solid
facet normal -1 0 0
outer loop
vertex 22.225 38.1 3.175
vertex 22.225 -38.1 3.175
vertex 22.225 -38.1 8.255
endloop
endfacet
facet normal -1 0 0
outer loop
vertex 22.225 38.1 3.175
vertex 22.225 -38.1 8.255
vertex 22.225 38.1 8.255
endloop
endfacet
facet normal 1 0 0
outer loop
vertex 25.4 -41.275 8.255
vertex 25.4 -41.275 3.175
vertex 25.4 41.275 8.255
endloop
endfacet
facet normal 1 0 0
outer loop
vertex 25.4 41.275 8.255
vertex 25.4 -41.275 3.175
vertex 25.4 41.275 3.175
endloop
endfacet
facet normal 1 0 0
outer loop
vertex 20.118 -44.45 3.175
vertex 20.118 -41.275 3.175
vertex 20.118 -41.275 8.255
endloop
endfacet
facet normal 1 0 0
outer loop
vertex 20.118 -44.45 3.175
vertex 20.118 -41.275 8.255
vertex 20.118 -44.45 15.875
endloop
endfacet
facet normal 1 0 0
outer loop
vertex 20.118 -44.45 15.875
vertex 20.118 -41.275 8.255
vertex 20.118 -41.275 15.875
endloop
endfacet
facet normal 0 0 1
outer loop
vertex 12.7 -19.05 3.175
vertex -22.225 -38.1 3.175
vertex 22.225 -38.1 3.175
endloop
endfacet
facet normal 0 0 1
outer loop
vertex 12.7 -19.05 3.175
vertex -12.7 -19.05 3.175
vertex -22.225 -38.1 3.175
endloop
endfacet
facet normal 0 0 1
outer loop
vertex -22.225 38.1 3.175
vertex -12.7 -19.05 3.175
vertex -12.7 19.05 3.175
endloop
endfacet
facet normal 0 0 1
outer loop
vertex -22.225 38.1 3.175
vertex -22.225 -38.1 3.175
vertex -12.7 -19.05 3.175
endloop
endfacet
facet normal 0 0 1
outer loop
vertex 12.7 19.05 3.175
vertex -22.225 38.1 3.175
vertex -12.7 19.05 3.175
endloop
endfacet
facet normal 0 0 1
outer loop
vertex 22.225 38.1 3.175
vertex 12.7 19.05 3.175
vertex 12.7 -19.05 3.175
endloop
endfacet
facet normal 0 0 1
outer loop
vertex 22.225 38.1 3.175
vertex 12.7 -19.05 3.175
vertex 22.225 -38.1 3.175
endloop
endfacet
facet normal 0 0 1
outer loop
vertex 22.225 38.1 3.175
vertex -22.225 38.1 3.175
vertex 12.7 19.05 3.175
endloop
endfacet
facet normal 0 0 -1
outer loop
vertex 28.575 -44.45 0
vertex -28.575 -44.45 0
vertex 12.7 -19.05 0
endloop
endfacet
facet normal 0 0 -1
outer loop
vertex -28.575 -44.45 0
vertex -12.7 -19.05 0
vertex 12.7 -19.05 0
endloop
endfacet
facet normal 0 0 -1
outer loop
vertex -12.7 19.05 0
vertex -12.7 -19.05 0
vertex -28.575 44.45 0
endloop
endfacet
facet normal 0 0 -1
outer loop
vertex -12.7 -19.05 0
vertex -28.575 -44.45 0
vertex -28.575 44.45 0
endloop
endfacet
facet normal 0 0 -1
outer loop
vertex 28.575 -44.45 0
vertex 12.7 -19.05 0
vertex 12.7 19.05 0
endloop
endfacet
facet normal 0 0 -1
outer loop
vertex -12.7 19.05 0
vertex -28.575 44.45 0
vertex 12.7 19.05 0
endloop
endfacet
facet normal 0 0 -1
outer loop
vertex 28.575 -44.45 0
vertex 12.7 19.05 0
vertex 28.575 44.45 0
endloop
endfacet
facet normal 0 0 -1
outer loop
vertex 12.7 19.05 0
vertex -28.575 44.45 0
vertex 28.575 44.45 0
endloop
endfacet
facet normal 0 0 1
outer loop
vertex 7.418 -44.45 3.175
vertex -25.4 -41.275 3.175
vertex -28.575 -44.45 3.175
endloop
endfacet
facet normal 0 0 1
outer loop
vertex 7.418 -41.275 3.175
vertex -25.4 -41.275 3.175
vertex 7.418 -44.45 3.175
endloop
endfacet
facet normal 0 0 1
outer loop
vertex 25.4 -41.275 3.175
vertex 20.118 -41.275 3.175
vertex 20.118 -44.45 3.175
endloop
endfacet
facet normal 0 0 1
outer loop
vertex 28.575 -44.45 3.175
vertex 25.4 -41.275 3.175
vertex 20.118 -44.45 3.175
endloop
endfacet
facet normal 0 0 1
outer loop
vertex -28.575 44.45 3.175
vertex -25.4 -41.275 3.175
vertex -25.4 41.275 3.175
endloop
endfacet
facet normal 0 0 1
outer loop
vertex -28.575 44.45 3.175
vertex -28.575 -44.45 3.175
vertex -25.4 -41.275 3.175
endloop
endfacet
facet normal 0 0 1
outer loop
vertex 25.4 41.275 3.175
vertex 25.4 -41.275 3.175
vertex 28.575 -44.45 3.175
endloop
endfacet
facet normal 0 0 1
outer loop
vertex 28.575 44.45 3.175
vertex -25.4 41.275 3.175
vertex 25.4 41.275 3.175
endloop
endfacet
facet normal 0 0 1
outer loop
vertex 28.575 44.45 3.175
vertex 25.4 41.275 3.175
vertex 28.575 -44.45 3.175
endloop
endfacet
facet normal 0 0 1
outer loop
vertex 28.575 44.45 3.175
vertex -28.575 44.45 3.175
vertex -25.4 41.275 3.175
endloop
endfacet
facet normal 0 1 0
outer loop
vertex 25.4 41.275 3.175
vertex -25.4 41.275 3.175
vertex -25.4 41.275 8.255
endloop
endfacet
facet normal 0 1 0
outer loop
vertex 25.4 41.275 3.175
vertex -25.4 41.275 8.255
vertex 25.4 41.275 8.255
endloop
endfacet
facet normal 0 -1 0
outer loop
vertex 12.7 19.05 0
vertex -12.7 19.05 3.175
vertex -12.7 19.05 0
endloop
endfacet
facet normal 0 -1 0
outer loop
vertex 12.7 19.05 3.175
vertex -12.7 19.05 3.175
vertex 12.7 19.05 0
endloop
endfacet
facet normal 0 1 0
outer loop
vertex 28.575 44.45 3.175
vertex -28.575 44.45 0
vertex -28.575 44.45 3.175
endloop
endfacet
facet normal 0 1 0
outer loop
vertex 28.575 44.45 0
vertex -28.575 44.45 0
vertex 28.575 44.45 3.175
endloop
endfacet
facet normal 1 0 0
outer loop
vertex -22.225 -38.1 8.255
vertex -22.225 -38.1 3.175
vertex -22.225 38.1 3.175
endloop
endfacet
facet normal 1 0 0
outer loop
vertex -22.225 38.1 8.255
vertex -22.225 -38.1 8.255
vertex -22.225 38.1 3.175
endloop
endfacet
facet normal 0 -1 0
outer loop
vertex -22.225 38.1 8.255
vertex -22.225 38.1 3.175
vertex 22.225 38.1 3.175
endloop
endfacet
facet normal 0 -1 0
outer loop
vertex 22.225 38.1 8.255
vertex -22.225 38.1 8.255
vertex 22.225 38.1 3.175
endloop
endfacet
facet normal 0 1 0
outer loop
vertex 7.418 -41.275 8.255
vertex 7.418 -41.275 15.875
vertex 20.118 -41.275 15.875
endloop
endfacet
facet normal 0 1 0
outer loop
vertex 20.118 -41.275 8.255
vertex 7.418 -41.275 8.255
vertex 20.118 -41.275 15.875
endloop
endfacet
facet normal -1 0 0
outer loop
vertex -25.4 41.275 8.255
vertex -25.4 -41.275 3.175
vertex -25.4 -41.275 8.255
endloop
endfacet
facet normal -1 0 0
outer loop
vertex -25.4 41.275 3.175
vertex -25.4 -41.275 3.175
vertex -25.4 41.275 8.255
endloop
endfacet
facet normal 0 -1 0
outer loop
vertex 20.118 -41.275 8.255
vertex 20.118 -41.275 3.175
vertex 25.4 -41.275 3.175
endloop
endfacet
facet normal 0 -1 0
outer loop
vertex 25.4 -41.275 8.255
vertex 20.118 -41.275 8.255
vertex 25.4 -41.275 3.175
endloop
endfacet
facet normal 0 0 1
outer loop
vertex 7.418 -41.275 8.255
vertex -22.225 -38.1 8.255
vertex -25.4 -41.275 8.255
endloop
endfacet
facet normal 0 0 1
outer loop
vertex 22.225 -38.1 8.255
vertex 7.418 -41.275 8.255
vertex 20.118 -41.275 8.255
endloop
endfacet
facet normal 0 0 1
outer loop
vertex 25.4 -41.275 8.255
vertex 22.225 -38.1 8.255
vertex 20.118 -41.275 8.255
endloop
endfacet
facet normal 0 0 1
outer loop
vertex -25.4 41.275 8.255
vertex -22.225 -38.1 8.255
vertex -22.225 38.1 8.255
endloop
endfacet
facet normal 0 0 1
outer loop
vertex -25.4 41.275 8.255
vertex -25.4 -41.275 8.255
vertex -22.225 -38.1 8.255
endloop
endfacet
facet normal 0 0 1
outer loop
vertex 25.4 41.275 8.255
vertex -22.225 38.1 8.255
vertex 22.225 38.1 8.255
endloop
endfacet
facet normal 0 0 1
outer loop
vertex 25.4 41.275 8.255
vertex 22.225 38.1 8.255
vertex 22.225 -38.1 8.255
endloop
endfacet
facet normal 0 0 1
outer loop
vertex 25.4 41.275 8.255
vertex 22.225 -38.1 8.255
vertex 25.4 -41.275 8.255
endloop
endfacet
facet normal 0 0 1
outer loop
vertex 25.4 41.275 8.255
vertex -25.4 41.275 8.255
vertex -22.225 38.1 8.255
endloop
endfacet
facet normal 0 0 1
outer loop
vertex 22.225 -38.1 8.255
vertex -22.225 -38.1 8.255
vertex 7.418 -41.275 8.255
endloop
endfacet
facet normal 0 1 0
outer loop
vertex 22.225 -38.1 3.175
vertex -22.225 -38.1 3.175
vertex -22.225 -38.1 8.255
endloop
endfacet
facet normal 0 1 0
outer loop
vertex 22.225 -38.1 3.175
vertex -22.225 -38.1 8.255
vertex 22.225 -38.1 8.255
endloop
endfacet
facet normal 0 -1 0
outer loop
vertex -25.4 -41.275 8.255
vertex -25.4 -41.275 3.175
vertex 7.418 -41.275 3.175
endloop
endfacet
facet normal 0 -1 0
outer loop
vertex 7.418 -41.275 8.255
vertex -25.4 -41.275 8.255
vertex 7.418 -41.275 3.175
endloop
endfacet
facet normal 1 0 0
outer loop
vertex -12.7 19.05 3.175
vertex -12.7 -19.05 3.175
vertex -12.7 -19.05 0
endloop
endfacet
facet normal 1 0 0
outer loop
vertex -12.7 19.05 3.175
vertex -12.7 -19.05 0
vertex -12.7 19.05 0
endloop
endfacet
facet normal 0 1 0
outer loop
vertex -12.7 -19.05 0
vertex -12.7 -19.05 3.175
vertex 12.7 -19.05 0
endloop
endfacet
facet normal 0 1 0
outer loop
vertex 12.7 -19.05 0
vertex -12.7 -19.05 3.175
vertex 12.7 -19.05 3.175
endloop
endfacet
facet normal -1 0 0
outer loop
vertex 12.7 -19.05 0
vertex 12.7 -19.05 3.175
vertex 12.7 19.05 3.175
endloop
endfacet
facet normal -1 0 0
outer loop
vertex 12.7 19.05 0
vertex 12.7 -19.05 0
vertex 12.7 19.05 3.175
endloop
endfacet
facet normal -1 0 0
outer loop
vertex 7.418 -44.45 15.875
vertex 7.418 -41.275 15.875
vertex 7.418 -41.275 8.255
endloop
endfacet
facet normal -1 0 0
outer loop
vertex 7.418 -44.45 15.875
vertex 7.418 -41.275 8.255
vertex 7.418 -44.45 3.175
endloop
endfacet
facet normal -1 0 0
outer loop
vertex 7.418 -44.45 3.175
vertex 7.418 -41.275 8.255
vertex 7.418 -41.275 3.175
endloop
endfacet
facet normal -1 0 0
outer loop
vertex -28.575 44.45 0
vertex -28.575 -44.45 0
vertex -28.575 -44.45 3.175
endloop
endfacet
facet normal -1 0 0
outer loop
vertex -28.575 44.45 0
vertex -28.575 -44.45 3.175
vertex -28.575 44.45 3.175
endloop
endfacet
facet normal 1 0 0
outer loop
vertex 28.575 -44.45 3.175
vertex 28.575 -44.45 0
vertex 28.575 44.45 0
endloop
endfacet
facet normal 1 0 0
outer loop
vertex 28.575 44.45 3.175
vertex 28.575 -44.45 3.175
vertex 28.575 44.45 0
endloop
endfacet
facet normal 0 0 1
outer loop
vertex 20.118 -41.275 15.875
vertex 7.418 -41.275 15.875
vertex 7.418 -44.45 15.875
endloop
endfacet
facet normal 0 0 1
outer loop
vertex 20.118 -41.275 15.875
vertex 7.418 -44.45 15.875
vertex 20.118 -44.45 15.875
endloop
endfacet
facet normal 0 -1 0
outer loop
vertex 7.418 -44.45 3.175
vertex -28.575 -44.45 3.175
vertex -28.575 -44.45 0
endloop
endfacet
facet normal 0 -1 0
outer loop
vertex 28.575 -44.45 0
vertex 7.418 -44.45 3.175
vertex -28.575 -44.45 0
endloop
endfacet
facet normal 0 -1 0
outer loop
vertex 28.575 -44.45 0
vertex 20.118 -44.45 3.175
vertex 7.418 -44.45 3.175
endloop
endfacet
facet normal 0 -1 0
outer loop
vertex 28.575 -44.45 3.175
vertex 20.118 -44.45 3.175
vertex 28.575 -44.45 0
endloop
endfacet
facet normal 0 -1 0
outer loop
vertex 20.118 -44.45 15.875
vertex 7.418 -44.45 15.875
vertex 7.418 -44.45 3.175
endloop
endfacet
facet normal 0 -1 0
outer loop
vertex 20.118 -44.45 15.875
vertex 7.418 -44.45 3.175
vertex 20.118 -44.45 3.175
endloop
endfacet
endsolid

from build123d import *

# Parameters (mm, degrees)
F0_W        = 57.15
F0_H        = 88.9
F1_DEPTH    = 3.175
F2_W        = 50.8
F2_H        = 82.55
F3_DEPTH    = 5.08
F4_T        = 3.175
F4_T3_DEPTH = 57.15
F4_T5_DEPTH = 88.9
F5_W        = 25.4
F5_H        = 38.1
F6_DEPTH    = 25.4
F7_W        = 12.7
F7_H        = 7.62
F7_H_2      = 5.08
F8_DEPTH    = 3.175


# Not quite as in the source:
# - a shell that OpenCascade refuses in one call is made with other operations: the cavity is built on its own and cut out


with BuildPart() as f1:
    # F0 (on Top) → F1 (new body)
    with BuildSketch(Plane.XY):
        Rectangle(F0_W, F0_H)
    extrude(amount=F1_DEPTH)

    # F2 (on face) → F3 (join)
    with BuildSketch(Plane.XY.offset(3.175)):
        Rectangle(F2_W, F2_H)
    extrude(amount=F3_DEPTH)

    # F4: shell of thickness 3.175, made by hand


with BuildPart() as f4_core1:
    # F4_t2: copy of F1
    add(f1.part)

    # the walls: a layer under each face that stays
    f4_faces = [f4_core1.faces().sort_by_distance(p)[0] for p in [
        (0, 44.45, 1.5875),
        (28.575, 0, 1.5875),
        (-28.575, 0, 1.5875),
        (0, 0, 0),
        (-26.67, -41.4866666667, 3.175),
        (0, -44.45, 1.5875),
        (0, 41.275, 5.715),
        (-25.4, 0, 5.715),
        (0, -41.275, 5.715),
        (25.4, 0, 5.715),
    ]]
    thicken(f4_faces, amount=-F4_T, mode=Mode.SUBTRACT)

    # F4_s4 → F4_t3 (cut)
    with BuildSketch(Plane.YZ.offset(-28.575)):
        Polygon((41.30675, 3.20675), (41.275, 0), (38.1, 0), (38.1, 3.175), align=None)
        Polygon((-41.30675, 3.20675), (-41.275, 0), (-38.1, 0), (-38.1, 3.175), align=None)
    extrude(amount=F4_T3_DEPTH, mode=Mode.SUBTRACT)

    # F4_s6 → F4_t5 (cut)
    with BuildSketch(Plane.XZ.offset(-44.45)):
        Polygon((-25.43175, 3.20675), (-25.4, 0), (-22.225, 0), (-22.225, 3.175), align=None)
        Polygon((25.43175, 3.20675), (25.4, 0), (22.225, 0), (22.225, 3.175), align=None)
    extrude(amount=F4_T5_DEPTH, mode=Mode.SUBTRACT)


with BuildPart() as f1_1:
    add(f1.part)

    # what is left inside the walls is the cavity
    f4_cavity = [f4_core1.part.solids().sort_by_distance(p)[0] for p in [
        (0, -12.7, 3.20675),
    ]]
    add(f4_cavity, mode=Mode.SUBTRACT)

    # F5 (on face) → F6 (cut)
    with BuildSketch(Plane.XY.offset(3.175)):
        Rectangle(F5_W, F5_H)
    extrude(amount=-F6_DEPTH, mode=Mode.SUBTRACT)

    # F7 (on face) → F8 (join)
    with BuildSketch(Plane.XZ.offset(41.275)):
        with Locations((13.7679782532, 12.065)):
            Rectangle(F7_W, F7_H)
        with Locations((13.7679782532, 5.715)):
            Rectangle(F7_W, F7_H_2)
    extrude(amount=F8_DEPTH)


solid = f1_1.part
